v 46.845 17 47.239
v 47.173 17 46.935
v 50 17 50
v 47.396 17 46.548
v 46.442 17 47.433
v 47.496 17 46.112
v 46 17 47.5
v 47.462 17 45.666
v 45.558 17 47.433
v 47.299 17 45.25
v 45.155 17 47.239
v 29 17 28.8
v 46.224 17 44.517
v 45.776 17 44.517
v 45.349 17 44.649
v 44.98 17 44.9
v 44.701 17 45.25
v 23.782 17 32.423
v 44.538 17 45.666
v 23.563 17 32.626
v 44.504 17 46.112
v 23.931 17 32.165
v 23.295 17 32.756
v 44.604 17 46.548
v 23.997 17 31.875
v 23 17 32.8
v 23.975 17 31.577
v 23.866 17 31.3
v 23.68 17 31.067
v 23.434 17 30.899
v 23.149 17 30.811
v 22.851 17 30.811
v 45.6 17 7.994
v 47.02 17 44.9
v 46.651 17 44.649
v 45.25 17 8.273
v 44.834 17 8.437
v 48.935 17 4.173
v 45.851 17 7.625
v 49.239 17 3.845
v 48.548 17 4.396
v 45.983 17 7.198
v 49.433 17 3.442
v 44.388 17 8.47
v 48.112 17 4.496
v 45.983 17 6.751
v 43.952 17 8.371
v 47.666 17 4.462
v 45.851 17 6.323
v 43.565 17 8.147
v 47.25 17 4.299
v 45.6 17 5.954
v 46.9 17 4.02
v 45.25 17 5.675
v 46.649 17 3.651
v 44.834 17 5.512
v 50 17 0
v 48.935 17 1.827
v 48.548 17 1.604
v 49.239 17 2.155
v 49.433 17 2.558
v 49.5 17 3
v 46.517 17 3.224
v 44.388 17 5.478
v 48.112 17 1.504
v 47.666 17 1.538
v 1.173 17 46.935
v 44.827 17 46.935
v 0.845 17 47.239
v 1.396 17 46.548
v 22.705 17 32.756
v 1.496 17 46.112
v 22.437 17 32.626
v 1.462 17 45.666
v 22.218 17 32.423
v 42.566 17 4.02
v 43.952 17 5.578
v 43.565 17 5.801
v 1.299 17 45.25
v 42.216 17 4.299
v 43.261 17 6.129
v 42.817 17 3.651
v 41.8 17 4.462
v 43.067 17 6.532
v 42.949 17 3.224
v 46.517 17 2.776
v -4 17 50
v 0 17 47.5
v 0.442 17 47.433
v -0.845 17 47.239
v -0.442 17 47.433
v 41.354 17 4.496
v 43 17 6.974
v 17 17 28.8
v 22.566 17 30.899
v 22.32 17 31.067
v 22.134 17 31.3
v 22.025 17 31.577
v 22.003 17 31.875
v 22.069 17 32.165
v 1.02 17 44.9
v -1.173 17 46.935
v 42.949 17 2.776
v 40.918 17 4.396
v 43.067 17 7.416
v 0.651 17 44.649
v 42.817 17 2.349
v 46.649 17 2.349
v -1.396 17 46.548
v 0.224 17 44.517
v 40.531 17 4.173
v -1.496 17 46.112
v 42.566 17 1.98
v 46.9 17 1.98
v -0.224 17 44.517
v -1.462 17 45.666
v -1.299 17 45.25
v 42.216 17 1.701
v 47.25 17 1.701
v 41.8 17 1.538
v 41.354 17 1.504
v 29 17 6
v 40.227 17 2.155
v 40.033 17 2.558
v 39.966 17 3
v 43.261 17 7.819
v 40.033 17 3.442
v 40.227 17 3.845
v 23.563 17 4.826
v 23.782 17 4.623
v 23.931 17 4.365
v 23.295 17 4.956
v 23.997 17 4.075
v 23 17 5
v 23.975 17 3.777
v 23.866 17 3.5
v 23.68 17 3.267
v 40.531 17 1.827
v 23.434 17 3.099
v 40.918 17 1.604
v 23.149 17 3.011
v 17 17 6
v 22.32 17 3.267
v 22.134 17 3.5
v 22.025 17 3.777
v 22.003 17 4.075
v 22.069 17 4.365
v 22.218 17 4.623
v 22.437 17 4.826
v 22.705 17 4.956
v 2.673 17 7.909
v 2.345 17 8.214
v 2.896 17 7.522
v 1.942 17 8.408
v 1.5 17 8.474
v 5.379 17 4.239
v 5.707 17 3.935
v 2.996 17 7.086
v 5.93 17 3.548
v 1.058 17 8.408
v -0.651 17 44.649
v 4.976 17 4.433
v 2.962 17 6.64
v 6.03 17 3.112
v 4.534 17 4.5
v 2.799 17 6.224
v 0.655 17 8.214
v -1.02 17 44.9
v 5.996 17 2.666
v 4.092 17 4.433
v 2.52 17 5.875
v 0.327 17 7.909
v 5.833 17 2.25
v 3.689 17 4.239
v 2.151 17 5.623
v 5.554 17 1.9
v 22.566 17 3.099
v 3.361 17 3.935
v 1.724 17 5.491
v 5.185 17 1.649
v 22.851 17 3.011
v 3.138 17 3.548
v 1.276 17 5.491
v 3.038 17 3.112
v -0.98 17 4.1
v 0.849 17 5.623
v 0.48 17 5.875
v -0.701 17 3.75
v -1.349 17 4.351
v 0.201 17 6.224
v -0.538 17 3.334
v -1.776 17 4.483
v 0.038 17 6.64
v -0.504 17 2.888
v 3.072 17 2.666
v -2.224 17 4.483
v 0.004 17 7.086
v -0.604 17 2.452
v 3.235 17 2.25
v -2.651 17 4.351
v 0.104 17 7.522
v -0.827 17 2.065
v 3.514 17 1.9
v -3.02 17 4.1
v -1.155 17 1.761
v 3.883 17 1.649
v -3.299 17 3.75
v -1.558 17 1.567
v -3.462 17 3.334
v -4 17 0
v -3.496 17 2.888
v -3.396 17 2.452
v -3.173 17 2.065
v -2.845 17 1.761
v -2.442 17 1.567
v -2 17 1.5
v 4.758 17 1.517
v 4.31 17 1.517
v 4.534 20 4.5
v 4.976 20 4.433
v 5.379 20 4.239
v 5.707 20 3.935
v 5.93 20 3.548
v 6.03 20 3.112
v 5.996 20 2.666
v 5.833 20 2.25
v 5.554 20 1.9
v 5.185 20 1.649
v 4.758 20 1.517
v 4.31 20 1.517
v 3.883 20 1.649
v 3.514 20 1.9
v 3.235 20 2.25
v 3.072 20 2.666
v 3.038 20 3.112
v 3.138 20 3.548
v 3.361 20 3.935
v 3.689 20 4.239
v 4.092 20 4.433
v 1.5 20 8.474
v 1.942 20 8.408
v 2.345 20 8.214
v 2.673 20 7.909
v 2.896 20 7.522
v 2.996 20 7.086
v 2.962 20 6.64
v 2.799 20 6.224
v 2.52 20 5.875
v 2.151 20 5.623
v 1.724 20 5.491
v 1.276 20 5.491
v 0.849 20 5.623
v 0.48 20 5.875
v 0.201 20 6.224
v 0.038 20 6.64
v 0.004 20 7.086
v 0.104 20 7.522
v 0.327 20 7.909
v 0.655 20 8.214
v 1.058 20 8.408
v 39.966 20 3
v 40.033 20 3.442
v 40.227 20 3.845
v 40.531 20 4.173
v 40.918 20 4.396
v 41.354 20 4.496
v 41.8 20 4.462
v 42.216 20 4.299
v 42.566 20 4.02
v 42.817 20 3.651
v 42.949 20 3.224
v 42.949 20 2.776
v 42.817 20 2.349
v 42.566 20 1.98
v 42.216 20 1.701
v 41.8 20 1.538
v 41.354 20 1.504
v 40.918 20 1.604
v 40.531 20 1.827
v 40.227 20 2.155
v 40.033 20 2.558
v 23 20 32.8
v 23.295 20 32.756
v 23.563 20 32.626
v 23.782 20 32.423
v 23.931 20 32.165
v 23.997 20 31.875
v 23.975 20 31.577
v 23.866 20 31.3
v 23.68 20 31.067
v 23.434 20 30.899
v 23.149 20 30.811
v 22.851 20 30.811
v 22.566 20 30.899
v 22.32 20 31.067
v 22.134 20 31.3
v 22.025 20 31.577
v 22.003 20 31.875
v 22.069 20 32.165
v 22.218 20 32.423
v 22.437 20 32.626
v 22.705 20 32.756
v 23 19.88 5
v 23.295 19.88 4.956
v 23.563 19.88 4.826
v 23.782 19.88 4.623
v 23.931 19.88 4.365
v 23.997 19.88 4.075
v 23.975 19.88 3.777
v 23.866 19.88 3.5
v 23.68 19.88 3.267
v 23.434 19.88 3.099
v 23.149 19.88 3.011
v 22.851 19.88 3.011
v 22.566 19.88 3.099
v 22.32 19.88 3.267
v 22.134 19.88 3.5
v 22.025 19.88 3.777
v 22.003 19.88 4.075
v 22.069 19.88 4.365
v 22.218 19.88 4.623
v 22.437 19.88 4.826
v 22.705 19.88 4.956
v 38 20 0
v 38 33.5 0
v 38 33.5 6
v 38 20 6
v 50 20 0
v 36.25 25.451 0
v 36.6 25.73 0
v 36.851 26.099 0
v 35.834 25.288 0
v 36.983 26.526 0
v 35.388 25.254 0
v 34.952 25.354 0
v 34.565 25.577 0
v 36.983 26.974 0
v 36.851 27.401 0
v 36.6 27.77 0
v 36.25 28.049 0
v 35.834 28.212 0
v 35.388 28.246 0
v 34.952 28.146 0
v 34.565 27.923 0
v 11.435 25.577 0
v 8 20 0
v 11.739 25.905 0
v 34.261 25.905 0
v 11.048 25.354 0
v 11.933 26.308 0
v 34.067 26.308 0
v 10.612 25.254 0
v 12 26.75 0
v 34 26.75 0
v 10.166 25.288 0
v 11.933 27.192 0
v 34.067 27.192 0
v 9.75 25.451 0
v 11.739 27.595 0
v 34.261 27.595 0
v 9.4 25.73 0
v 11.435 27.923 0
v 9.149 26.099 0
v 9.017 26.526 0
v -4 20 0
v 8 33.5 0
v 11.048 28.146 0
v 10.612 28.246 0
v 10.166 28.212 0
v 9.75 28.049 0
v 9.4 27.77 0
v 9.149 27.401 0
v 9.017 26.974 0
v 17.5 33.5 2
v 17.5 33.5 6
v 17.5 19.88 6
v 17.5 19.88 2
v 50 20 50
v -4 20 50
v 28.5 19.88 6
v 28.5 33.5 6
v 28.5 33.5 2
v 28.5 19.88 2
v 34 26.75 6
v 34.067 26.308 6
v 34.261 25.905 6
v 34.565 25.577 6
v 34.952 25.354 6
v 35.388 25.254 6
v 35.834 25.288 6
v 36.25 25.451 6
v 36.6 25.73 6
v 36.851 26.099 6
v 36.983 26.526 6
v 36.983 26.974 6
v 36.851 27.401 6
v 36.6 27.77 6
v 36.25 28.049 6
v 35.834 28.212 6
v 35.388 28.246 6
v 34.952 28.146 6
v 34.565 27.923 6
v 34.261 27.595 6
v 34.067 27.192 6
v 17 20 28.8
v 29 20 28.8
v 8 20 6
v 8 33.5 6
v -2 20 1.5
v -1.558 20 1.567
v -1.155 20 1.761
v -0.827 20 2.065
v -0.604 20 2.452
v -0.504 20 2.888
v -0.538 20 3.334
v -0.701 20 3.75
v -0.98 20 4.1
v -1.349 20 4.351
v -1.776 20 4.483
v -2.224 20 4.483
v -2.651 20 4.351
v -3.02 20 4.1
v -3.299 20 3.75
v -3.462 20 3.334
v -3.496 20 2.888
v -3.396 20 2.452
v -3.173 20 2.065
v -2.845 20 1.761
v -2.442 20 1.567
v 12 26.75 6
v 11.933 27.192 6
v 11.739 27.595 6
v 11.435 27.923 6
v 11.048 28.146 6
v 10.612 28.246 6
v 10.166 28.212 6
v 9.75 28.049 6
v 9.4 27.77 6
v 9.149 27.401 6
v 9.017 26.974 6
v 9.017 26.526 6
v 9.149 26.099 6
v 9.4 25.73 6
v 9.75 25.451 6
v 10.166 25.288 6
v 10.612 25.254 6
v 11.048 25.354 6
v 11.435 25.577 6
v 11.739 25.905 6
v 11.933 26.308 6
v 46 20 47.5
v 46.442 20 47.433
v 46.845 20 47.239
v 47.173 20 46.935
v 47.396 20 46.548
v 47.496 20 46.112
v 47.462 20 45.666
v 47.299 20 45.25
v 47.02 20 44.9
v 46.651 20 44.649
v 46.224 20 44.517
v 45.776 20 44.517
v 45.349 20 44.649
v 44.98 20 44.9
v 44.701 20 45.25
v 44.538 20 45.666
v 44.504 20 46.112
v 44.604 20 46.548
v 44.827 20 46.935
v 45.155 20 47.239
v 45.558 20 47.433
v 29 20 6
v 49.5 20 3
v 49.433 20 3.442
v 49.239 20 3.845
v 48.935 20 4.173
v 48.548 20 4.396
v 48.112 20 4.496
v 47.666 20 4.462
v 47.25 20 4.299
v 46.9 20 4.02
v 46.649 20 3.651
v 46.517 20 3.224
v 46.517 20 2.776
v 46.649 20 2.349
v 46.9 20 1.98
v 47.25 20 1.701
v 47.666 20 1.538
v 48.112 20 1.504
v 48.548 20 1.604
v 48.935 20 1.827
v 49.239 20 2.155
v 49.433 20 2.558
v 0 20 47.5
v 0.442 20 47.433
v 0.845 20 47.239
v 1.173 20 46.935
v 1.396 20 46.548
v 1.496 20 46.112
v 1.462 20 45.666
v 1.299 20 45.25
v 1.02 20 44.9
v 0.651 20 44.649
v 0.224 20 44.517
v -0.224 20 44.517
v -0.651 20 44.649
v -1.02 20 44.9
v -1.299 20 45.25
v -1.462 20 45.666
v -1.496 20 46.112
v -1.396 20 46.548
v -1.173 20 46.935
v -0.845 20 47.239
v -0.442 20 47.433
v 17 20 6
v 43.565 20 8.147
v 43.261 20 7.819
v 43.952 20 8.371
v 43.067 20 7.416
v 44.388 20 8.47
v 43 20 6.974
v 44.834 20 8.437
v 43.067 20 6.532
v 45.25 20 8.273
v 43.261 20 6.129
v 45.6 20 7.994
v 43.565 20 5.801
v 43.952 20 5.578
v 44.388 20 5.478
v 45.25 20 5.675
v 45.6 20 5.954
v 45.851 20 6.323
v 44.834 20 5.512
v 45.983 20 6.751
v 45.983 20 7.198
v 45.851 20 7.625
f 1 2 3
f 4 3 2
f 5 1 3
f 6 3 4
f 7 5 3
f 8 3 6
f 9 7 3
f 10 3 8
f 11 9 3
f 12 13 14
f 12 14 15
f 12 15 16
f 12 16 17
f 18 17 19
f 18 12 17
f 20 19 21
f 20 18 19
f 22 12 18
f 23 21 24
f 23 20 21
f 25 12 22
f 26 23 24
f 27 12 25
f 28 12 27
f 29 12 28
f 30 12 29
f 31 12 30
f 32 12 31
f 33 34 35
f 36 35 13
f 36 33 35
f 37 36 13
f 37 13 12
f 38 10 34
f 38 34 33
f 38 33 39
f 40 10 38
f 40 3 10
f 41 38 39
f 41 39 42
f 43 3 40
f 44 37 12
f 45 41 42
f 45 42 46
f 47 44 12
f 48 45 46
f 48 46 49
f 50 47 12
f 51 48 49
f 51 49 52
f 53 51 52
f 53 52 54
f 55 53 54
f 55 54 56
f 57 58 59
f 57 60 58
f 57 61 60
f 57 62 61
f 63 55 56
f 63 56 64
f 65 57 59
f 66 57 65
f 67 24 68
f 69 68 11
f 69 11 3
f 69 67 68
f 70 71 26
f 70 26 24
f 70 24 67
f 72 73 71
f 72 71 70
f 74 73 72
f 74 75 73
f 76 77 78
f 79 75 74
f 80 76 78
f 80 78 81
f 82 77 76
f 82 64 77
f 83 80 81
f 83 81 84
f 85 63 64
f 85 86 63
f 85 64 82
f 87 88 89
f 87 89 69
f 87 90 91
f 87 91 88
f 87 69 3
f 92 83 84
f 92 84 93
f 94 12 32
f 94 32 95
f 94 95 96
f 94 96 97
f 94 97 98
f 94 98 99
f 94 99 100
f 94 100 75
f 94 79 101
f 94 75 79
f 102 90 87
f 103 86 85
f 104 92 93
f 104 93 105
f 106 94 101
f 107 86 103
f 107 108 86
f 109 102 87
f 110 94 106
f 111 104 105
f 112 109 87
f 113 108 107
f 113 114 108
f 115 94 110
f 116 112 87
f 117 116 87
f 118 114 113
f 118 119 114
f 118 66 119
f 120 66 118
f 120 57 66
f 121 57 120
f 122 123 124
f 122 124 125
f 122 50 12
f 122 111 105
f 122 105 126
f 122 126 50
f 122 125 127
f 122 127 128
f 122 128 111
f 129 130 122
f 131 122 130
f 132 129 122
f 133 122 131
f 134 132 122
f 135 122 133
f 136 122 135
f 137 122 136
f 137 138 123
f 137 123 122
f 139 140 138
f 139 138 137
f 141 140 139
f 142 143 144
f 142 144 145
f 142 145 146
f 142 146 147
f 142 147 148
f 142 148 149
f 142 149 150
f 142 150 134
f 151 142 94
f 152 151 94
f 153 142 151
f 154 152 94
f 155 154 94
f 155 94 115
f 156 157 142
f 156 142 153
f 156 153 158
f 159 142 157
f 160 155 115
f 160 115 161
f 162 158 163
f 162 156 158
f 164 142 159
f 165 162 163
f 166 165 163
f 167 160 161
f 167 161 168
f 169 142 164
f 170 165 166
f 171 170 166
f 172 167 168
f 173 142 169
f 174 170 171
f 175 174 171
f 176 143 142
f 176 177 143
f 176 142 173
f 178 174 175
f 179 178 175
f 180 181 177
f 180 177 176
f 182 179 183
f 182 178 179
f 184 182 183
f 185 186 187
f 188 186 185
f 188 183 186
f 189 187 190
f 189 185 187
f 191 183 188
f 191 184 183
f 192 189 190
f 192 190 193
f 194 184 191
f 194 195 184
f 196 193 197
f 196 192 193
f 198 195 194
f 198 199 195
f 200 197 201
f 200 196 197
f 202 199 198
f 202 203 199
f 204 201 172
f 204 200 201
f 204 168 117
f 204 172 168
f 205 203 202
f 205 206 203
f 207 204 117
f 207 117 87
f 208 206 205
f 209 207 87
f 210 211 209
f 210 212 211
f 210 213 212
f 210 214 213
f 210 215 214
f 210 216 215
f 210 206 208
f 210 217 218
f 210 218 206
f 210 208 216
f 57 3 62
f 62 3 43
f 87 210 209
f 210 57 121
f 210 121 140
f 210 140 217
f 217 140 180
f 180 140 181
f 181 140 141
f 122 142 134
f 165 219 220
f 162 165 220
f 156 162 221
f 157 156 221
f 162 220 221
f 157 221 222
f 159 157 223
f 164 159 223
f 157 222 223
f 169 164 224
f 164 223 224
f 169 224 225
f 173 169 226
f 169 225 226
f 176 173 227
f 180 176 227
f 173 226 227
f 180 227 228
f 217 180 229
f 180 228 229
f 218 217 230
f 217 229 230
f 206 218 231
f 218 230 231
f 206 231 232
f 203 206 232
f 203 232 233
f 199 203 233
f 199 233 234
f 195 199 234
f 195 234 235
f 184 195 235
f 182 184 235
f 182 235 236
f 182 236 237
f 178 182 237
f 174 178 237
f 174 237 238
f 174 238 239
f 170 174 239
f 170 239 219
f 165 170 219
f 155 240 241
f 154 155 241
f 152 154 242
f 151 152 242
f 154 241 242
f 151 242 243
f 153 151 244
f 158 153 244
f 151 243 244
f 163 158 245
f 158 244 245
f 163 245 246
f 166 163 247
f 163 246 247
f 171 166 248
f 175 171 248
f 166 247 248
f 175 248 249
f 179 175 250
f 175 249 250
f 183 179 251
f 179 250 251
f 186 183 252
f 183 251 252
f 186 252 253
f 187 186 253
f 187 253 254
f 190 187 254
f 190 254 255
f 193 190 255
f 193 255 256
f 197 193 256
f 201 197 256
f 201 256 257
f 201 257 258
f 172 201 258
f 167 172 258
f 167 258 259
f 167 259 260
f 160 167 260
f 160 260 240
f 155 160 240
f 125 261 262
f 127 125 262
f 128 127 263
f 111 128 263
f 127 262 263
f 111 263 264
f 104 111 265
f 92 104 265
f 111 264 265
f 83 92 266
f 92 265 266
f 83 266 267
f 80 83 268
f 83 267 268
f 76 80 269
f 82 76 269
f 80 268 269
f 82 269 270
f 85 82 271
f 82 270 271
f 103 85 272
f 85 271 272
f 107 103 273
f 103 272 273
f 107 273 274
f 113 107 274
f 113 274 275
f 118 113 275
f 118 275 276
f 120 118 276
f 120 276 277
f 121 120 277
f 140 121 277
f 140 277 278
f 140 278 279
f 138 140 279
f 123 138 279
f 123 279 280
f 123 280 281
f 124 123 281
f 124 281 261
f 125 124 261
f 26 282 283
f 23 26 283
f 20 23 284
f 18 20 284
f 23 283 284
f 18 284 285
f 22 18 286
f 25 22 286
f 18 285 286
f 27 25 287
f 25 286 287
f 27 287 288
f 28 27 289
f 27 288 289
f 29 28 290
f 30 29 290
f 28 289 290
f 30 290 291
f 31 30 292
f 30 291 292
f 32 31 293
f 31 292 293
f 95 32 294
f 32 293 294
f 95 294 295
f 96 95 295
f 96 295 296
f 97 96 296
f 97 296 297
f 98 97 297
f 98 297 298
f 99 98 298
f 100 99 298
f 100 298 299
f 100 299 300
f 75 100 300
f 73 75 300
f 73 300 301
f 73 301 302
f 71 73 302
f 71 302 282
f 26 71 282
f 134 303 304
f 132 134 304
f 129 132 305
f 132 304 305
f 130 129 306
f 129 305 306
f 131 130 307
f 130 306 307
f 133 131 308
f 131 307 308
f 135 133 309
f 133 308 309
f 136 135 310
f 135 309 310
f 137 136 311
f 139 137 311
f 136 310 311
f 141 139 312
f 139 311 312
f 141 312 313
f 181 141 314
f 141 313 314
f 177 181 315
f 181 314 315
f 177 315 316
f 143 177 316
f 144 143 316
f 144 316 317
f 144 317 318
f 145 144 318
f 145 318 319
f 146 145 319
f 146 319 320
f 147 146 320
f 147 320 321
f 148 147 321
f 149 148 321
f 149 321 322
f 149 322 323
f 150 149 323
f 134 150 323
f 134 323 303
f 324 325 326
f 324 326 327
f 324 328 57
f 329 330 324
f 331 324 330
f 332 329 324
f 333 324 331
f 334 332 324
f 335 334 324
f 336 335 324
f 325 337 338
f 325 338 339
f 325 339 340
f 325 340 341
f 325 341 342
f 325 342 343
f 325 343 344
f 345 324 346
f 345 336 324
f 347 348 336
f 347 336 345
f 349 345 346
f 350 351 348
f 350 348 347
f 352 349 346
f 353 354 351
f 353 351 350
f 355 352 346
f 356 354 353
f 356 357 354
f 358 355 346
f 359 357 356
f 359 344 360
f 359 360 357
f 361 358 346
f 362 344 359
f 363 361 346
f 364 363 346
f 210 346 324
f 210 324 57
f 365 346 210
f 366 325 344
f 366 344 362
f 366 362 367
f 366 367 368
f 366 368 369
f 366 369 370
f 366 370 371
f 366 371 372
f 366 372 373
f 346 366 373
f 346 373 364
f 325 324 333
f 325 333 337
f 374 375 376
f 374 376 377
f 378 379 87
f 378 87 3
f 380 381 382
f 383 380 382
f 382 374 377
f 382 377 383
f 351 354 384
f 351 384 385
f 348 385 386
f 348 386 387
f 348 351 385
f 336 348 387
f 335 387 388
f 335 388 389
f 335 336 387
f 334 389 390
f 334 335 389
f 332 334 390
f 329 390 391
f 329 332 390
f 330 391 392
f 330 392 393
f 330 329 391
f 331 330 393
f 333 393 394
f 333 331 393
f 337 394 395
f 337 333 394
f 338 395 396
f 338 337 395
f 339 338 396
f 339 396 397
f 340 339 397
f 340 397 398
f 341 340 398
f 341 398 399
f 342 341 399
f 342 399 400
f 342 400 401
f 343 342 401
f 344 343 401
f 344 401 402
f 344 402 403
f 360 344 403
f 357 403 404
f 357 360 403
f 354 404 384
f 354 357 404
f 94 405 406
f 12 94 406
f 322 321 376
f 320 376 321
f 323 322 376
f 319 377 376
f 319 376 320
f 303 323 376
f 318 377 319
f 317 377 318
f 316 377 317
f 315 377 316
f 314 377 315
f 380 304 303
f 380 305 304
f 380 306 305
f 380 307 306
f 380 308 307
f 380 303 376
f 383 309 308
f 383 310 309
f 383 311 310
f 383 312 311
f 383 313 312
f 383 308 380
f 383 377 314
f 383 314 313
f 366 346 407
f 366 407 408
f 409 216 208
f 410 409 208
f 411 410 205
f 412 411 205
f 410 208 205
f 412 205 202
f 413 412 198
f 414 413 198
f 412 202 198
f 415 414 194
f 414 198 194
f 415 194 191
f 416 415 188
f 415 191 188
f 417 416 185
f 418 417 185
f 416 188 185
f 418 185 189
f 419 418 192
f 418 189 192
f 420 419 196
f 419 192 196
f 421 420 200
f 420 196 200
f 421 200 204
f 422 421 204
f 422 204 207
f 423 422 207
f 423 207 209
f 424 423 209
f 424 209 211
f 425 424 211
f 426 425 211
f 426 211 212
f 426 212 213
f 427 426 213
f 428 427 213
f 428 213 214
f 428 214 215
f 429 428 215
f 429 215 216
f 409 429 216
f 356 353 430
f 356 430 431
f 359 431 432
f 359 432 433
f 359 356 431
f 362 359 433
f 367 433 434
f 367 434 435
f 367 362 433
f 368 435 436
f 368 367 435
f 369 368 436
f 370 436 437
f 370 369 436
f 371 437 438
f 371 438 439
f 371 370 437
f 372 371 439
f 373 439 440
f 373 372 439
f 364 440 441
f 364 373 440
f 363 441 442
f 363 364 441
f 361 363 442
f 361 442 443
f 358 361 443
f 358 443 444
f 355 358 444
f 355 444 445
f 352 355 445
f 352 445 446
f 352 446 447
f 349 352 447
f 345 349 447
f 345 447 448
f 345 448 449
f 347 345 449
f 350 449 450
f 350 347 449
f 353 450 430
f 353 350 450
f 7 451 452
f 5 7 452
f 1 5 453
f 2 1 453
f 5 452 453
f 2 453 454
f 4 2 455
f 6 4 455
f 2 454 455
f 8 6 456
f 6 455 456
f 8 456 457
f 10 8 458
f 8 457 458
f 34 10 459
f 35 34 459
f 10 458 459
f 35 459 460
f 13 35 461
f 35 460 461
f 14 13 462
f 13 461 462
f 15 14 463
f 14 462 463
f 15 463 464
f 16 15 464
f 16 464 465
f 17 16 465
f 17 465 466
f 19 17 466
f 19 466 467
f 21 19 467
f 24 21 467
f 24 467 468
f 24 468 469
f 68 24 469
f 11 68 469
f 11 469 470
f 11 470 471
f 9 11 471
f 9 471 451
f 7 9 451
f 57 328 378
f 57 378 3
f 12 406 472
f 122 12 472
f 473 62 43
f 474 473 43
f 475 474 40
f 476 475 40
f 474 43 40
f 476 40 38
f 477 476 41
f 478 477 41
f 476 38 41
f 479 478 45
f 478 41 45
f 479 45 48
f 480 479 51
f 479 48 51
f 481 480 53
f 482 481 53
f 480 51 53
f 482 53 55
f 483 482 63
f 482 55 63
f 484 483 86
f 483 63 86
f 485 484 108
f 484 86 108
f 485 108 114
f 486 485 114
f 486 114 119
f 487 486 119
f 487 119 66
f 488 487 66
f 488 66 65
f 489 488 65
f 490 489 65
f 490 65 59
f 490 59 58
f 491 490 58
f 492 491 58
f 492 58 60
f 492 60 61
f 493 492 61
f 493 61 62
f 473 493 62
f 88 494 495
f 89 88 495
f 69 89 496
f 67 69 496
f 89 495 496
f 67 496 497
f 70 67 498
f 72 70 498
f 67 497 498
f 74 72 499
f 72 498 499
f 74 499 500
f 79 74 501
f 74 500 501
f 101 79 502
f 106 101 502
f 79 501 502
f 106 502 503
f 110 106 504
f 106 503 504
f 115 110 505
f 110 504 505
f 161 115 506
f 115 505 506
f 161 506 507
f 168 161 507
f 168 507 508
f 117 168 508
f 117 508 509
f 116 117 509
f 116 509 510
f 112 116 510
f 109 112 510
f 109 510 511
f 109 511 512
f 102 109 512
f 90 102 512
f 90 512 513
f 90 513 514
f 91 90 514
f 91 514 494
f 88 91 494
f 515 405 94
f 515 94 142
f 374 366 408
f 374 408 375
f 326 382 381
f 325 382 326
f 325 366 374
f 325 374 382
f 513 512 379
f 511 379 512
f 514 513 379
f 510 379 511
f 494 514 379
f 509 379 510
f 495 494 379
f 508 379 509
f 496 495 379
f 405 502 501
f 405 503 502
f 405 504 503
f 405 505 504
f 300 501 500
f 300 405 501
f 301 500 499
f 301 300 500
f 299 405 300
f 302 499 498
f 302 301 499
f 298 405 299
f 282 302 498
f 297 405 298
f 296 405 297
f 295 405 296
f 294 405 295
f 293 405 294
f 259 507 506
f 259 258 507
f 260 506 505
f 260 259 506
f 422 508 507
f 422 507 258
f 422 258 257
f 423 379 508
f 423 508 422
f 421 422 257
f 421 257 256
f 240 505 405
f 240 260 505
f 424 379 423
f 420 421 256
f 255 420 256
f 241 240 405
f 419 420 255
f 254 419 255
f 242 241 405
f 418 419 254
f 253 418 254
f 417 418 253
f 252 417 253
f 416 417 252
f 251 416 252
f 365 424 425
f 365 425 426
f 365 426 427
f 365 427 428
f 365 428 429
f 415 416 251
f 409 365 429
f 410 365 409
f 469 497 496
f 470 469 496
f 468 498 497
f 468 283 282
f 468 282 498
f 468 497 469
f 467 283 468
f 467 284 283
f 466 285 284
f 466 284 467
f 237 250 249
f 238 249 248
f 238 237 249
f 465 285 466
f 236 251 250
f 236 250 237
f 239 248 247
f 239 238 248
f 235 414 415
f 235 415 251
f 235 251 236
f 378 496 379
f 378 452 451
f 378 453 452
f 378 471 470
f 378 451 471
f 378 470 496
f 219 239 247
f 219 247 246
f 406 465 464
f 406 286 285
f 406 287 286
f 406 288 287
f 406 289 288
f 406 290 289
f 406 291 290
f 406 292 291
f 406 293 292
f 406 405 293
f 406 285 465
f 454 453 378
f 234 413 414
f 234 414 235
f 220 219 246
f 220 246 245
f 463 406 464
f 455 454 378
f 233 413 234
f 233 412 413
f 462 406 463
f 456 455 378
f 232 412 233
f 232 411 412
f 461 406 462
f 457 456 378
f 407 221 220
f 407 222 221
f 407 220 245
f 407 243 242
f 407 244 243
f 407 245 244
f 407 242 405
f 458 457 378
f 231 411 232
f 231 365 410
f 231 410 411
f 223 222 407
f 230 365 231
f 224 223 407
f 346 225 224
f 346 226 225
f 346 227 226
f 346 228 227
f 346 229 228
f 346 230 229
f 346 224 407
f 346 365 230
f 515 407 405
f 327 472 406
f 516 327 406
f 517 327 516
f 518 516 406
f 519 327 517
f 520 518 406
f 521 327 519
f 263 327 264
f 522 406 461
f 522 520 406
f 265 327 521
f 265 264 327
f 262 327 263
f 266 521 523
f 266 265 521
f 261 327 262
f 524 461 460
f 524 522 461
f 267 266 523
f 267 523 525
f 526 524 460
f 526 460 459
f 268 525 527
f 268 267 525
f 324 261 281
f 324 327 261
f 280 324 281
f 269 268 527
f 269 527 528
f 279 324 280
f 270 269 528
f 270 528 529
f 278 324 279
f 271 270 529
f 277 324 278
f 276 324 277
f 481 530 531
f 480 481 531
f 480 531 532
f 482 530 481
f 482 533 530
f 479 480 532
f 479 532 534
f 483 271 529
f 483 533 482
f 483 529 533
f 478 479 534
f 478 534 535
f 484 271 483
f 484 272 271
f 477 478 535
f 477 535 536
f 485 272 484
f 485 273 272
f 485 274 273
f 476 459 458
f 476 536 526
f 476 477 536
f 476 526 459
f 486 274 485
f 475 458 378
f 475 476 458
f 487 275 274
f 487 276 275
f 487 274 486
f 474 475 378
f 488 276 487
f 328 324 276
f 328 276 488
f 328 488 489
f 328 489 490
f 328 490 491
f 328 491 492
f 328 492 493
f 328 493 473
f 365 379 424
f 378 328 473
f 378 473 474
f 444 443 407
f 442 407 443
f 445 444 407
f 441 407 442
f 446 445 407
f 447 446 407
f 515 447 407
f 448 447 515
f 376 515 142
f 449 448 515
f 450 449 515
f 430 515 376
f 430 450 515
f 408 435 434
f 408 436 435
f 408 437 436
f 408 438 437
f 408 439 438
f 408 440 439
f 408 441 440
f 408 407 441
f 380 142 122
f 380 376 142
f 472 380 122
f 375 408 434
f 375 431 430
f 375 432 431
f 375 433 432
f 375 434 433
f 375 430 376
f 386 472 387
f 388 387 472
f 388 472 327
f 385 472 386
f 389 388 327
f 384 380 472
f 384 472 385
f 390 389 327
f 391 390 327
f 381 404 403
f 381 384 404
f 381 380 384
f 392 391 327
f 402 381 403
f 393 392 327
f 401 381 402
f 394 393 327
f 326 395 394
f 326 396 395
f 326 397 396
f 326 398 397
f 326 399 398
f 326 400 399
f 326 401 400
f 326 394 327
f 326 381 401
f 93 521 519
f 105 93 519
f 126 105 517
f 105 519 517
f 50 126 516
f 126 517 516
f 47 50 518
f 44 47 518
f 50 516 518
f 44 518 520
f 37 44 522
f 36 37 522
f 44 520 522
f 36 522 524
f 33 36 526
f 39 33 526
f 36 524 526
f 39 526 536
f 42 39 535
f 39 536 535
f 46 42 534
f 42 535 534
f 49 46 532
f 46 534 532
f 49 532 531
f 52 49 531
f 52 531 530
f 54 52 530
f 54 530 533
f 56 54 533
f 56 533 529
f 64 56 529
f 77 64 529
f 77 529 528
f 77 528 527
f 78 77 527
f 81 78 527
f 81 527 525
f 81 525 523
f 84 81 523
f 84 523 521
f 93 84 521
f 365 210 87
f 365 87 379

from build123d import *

# Parameters (mm, degrees)
SKETCH1_R           = 1.5
BOSS_EXTRUDE1_DEPTH = 6
SKETCH2_W           = 54
SKETCH2_H           = 3
BOSS_EXTRUDE2_DEPTH = 50
SKETCH4_R           = 1.5
SKETCH4_R_2         = 1
SKETCH4_W           = 12
SKETCH4_H           = 22.8
CUT_EXTRUDE1_DEPTH  = 24
SKETCH5_W           = 11
SKETCH5_H           = 4
CUT_EXTRUDE2_DEPTH  = 13.62
SKETCH6_R           = 1
CUT_EXTRUDE3_DEPTH  = 24
SKETCH7_R           = 1.5
CUT_EXTRUDE4_DEPTH  = 7
SKETCH8_R           = 1.5
CUT_EXTRUDE5_DEPTH  = 7
SKETCH3_R           = 1.5
CUT_EXTRUDE6_DEPTH  = 60
SKETCH9_R           = 1.5
CUT_EXTRUDE7_DEPTH  = 10


with BuildPart() as part:
    # Sketch1 → Boss-Extrude1 (new body)
    with BuildSketch(Plane.XY):
        Polygon((0, 0), (-4, 0), (-4, 20), (8, 20), (8, 33.5), (38, 33.5), (38, 20), (50, 20), (50, 0), (46, 0), (46, 17), (0, 17), align=None)
        with Locations((10.5, 26.75)):
            Circle(SKETCH1_R, mode=Mode.SUBTRACT)
        with Locations(Location((35.5, 26.75, 0), (0, 0, 180))):
            Circle(SKETCH1_R, mode=Mode.SUBTRACT)
    extrude(amount=BOSS_EXTRUDE1_DEPTH)

    # Sketch2 → Boss-Extrude2 (add)
    with BuildSketch(Plane.XY):
        with Locations((23, 18.5)):
            Rectangle(SKETCH2_W, SKETCH2_H)
    extrude(amount=BOSS_EXTRUDE2_DEPTH)

    # Sketch4 → Cut-Extrude1 (cut)
    with BuildSketch(Plane(origin=(0, 20, 0), x_dir=(1, 0, 0), z_dir=(0, 1, 0))):
        with Locations(Location((4.534048473, -3, 0), (0, 0, 270))):
            Circle(SKETCH4_R)
        with Locations(Location((1.5, -6.974235758, 0), (0, 0, 270))):
            Circle(SKETCH4_R)
        with Locations(Location((41.465951527, -3, 0), (0, 0, 180))):
            Circle(SKETCH4_R)
        with Locations(Location((44.5, -6.974235758, 0), (0, 0, 180))):
            Circle(SKETCH4_R)
        with Locations(Location((23, -31.8, 0), (0, 0, 270))):
            Circle(SKETCH4_R_2)
        with Locations((23, -17.4)):
            Rectangle(SKETCH4_W, SKETCH4_H)
    extrude(amount=-CUT_EXTRUDE1_DEPTH, mode=Mode.SUBTRACT)

    # Sketch5 → Cut-Extrude2 (cut)
    with BuildSketch(Plane(origin=(0, 33.5, 0), x_dir=(1, 0, 0), z_dir=(0, 1, 0))):
        with Locations((23, -4)):
            Rectangle(SKETCH5_W, SKETCH5_H)
    extrude(amount=-CUT_EXTRUDE2_DEPTH, mode=Mode.SUBTRACT)

    # Sketch6 → Cut-Extrude3 (cut)
    with BuildSketch(Plane(origin=(0, 19.88, 0), x_dir=(1, 0, 0), z_dir=(0, 1, 0))):
        with Locations(Location((23, -4, 0), (0, 0, 270))):
            Circle(SKETCH6_R)
    extrude(amount=-CUT_EXTRUDE3_DEPTH, mode=Mode.SUBTRACT)

    # Sketch7 → Cut-Extrude4 (cut)
    with BuildSketch(Plane.XZ):
        with Locations((48, 3)):
            Circle(SKETCH7_R)
    extrude(amount=-CUT_EXTRUDE4_DEPTH, mode=Mode.SUBTRACT)

    # Sketch8 → Cut-Extrude5 (cut)
    with BuildSketch(Plane.XZ):
        with Locations(Location((-2, 3, 0), (0, 0, 270))):
            Circle(SKETCH8_R)
    extrude(amount=-CUT_EXTRUDE5_DEPTH, mode=Mode.SUBTRACT)

    # Sketch3 → Cut-Extrude6 (cut)
    with BuildSketch(Plane(origin=(0, 20, 0), x_dir=(1, 0, 0), z_dir=(0, 1, 0))):
        with Locations(Location((0, -46, 0), (0, 0, 270))):
            Circle(SKETCH3_R)
        with Locations(Location((46, -46, 0), (0, 0, 270))):
            Circle(SKETCH3_R)
    extrude(amount=-CUT_EXTRUDE6_DEPTH, mode=Mode.SUBTRACT)

    # Sketch9 → Cut-Extrude7 (cut)
    with BuildSketch(Plane.XZ.offset(-17)):
        with Locations((48, 3)):
            Circle(SKETCH9_R)
        with Locations(Location((-2, 3, 0), (0, 0, 270))):
            Circle(SKETCH9_R)
    extrude(amount=-CUT_EXTRUDE7_DEPTH, mode=Mode.SUBTRACT)

    # SurfaceCut1
    split(bisect_by=Plane(origin=(0, 17, 0), x_dir=(-1, 0, 0), z_dir=(0, -1, 0)), keep=Keep.BOTTOM)


solid = part.part
